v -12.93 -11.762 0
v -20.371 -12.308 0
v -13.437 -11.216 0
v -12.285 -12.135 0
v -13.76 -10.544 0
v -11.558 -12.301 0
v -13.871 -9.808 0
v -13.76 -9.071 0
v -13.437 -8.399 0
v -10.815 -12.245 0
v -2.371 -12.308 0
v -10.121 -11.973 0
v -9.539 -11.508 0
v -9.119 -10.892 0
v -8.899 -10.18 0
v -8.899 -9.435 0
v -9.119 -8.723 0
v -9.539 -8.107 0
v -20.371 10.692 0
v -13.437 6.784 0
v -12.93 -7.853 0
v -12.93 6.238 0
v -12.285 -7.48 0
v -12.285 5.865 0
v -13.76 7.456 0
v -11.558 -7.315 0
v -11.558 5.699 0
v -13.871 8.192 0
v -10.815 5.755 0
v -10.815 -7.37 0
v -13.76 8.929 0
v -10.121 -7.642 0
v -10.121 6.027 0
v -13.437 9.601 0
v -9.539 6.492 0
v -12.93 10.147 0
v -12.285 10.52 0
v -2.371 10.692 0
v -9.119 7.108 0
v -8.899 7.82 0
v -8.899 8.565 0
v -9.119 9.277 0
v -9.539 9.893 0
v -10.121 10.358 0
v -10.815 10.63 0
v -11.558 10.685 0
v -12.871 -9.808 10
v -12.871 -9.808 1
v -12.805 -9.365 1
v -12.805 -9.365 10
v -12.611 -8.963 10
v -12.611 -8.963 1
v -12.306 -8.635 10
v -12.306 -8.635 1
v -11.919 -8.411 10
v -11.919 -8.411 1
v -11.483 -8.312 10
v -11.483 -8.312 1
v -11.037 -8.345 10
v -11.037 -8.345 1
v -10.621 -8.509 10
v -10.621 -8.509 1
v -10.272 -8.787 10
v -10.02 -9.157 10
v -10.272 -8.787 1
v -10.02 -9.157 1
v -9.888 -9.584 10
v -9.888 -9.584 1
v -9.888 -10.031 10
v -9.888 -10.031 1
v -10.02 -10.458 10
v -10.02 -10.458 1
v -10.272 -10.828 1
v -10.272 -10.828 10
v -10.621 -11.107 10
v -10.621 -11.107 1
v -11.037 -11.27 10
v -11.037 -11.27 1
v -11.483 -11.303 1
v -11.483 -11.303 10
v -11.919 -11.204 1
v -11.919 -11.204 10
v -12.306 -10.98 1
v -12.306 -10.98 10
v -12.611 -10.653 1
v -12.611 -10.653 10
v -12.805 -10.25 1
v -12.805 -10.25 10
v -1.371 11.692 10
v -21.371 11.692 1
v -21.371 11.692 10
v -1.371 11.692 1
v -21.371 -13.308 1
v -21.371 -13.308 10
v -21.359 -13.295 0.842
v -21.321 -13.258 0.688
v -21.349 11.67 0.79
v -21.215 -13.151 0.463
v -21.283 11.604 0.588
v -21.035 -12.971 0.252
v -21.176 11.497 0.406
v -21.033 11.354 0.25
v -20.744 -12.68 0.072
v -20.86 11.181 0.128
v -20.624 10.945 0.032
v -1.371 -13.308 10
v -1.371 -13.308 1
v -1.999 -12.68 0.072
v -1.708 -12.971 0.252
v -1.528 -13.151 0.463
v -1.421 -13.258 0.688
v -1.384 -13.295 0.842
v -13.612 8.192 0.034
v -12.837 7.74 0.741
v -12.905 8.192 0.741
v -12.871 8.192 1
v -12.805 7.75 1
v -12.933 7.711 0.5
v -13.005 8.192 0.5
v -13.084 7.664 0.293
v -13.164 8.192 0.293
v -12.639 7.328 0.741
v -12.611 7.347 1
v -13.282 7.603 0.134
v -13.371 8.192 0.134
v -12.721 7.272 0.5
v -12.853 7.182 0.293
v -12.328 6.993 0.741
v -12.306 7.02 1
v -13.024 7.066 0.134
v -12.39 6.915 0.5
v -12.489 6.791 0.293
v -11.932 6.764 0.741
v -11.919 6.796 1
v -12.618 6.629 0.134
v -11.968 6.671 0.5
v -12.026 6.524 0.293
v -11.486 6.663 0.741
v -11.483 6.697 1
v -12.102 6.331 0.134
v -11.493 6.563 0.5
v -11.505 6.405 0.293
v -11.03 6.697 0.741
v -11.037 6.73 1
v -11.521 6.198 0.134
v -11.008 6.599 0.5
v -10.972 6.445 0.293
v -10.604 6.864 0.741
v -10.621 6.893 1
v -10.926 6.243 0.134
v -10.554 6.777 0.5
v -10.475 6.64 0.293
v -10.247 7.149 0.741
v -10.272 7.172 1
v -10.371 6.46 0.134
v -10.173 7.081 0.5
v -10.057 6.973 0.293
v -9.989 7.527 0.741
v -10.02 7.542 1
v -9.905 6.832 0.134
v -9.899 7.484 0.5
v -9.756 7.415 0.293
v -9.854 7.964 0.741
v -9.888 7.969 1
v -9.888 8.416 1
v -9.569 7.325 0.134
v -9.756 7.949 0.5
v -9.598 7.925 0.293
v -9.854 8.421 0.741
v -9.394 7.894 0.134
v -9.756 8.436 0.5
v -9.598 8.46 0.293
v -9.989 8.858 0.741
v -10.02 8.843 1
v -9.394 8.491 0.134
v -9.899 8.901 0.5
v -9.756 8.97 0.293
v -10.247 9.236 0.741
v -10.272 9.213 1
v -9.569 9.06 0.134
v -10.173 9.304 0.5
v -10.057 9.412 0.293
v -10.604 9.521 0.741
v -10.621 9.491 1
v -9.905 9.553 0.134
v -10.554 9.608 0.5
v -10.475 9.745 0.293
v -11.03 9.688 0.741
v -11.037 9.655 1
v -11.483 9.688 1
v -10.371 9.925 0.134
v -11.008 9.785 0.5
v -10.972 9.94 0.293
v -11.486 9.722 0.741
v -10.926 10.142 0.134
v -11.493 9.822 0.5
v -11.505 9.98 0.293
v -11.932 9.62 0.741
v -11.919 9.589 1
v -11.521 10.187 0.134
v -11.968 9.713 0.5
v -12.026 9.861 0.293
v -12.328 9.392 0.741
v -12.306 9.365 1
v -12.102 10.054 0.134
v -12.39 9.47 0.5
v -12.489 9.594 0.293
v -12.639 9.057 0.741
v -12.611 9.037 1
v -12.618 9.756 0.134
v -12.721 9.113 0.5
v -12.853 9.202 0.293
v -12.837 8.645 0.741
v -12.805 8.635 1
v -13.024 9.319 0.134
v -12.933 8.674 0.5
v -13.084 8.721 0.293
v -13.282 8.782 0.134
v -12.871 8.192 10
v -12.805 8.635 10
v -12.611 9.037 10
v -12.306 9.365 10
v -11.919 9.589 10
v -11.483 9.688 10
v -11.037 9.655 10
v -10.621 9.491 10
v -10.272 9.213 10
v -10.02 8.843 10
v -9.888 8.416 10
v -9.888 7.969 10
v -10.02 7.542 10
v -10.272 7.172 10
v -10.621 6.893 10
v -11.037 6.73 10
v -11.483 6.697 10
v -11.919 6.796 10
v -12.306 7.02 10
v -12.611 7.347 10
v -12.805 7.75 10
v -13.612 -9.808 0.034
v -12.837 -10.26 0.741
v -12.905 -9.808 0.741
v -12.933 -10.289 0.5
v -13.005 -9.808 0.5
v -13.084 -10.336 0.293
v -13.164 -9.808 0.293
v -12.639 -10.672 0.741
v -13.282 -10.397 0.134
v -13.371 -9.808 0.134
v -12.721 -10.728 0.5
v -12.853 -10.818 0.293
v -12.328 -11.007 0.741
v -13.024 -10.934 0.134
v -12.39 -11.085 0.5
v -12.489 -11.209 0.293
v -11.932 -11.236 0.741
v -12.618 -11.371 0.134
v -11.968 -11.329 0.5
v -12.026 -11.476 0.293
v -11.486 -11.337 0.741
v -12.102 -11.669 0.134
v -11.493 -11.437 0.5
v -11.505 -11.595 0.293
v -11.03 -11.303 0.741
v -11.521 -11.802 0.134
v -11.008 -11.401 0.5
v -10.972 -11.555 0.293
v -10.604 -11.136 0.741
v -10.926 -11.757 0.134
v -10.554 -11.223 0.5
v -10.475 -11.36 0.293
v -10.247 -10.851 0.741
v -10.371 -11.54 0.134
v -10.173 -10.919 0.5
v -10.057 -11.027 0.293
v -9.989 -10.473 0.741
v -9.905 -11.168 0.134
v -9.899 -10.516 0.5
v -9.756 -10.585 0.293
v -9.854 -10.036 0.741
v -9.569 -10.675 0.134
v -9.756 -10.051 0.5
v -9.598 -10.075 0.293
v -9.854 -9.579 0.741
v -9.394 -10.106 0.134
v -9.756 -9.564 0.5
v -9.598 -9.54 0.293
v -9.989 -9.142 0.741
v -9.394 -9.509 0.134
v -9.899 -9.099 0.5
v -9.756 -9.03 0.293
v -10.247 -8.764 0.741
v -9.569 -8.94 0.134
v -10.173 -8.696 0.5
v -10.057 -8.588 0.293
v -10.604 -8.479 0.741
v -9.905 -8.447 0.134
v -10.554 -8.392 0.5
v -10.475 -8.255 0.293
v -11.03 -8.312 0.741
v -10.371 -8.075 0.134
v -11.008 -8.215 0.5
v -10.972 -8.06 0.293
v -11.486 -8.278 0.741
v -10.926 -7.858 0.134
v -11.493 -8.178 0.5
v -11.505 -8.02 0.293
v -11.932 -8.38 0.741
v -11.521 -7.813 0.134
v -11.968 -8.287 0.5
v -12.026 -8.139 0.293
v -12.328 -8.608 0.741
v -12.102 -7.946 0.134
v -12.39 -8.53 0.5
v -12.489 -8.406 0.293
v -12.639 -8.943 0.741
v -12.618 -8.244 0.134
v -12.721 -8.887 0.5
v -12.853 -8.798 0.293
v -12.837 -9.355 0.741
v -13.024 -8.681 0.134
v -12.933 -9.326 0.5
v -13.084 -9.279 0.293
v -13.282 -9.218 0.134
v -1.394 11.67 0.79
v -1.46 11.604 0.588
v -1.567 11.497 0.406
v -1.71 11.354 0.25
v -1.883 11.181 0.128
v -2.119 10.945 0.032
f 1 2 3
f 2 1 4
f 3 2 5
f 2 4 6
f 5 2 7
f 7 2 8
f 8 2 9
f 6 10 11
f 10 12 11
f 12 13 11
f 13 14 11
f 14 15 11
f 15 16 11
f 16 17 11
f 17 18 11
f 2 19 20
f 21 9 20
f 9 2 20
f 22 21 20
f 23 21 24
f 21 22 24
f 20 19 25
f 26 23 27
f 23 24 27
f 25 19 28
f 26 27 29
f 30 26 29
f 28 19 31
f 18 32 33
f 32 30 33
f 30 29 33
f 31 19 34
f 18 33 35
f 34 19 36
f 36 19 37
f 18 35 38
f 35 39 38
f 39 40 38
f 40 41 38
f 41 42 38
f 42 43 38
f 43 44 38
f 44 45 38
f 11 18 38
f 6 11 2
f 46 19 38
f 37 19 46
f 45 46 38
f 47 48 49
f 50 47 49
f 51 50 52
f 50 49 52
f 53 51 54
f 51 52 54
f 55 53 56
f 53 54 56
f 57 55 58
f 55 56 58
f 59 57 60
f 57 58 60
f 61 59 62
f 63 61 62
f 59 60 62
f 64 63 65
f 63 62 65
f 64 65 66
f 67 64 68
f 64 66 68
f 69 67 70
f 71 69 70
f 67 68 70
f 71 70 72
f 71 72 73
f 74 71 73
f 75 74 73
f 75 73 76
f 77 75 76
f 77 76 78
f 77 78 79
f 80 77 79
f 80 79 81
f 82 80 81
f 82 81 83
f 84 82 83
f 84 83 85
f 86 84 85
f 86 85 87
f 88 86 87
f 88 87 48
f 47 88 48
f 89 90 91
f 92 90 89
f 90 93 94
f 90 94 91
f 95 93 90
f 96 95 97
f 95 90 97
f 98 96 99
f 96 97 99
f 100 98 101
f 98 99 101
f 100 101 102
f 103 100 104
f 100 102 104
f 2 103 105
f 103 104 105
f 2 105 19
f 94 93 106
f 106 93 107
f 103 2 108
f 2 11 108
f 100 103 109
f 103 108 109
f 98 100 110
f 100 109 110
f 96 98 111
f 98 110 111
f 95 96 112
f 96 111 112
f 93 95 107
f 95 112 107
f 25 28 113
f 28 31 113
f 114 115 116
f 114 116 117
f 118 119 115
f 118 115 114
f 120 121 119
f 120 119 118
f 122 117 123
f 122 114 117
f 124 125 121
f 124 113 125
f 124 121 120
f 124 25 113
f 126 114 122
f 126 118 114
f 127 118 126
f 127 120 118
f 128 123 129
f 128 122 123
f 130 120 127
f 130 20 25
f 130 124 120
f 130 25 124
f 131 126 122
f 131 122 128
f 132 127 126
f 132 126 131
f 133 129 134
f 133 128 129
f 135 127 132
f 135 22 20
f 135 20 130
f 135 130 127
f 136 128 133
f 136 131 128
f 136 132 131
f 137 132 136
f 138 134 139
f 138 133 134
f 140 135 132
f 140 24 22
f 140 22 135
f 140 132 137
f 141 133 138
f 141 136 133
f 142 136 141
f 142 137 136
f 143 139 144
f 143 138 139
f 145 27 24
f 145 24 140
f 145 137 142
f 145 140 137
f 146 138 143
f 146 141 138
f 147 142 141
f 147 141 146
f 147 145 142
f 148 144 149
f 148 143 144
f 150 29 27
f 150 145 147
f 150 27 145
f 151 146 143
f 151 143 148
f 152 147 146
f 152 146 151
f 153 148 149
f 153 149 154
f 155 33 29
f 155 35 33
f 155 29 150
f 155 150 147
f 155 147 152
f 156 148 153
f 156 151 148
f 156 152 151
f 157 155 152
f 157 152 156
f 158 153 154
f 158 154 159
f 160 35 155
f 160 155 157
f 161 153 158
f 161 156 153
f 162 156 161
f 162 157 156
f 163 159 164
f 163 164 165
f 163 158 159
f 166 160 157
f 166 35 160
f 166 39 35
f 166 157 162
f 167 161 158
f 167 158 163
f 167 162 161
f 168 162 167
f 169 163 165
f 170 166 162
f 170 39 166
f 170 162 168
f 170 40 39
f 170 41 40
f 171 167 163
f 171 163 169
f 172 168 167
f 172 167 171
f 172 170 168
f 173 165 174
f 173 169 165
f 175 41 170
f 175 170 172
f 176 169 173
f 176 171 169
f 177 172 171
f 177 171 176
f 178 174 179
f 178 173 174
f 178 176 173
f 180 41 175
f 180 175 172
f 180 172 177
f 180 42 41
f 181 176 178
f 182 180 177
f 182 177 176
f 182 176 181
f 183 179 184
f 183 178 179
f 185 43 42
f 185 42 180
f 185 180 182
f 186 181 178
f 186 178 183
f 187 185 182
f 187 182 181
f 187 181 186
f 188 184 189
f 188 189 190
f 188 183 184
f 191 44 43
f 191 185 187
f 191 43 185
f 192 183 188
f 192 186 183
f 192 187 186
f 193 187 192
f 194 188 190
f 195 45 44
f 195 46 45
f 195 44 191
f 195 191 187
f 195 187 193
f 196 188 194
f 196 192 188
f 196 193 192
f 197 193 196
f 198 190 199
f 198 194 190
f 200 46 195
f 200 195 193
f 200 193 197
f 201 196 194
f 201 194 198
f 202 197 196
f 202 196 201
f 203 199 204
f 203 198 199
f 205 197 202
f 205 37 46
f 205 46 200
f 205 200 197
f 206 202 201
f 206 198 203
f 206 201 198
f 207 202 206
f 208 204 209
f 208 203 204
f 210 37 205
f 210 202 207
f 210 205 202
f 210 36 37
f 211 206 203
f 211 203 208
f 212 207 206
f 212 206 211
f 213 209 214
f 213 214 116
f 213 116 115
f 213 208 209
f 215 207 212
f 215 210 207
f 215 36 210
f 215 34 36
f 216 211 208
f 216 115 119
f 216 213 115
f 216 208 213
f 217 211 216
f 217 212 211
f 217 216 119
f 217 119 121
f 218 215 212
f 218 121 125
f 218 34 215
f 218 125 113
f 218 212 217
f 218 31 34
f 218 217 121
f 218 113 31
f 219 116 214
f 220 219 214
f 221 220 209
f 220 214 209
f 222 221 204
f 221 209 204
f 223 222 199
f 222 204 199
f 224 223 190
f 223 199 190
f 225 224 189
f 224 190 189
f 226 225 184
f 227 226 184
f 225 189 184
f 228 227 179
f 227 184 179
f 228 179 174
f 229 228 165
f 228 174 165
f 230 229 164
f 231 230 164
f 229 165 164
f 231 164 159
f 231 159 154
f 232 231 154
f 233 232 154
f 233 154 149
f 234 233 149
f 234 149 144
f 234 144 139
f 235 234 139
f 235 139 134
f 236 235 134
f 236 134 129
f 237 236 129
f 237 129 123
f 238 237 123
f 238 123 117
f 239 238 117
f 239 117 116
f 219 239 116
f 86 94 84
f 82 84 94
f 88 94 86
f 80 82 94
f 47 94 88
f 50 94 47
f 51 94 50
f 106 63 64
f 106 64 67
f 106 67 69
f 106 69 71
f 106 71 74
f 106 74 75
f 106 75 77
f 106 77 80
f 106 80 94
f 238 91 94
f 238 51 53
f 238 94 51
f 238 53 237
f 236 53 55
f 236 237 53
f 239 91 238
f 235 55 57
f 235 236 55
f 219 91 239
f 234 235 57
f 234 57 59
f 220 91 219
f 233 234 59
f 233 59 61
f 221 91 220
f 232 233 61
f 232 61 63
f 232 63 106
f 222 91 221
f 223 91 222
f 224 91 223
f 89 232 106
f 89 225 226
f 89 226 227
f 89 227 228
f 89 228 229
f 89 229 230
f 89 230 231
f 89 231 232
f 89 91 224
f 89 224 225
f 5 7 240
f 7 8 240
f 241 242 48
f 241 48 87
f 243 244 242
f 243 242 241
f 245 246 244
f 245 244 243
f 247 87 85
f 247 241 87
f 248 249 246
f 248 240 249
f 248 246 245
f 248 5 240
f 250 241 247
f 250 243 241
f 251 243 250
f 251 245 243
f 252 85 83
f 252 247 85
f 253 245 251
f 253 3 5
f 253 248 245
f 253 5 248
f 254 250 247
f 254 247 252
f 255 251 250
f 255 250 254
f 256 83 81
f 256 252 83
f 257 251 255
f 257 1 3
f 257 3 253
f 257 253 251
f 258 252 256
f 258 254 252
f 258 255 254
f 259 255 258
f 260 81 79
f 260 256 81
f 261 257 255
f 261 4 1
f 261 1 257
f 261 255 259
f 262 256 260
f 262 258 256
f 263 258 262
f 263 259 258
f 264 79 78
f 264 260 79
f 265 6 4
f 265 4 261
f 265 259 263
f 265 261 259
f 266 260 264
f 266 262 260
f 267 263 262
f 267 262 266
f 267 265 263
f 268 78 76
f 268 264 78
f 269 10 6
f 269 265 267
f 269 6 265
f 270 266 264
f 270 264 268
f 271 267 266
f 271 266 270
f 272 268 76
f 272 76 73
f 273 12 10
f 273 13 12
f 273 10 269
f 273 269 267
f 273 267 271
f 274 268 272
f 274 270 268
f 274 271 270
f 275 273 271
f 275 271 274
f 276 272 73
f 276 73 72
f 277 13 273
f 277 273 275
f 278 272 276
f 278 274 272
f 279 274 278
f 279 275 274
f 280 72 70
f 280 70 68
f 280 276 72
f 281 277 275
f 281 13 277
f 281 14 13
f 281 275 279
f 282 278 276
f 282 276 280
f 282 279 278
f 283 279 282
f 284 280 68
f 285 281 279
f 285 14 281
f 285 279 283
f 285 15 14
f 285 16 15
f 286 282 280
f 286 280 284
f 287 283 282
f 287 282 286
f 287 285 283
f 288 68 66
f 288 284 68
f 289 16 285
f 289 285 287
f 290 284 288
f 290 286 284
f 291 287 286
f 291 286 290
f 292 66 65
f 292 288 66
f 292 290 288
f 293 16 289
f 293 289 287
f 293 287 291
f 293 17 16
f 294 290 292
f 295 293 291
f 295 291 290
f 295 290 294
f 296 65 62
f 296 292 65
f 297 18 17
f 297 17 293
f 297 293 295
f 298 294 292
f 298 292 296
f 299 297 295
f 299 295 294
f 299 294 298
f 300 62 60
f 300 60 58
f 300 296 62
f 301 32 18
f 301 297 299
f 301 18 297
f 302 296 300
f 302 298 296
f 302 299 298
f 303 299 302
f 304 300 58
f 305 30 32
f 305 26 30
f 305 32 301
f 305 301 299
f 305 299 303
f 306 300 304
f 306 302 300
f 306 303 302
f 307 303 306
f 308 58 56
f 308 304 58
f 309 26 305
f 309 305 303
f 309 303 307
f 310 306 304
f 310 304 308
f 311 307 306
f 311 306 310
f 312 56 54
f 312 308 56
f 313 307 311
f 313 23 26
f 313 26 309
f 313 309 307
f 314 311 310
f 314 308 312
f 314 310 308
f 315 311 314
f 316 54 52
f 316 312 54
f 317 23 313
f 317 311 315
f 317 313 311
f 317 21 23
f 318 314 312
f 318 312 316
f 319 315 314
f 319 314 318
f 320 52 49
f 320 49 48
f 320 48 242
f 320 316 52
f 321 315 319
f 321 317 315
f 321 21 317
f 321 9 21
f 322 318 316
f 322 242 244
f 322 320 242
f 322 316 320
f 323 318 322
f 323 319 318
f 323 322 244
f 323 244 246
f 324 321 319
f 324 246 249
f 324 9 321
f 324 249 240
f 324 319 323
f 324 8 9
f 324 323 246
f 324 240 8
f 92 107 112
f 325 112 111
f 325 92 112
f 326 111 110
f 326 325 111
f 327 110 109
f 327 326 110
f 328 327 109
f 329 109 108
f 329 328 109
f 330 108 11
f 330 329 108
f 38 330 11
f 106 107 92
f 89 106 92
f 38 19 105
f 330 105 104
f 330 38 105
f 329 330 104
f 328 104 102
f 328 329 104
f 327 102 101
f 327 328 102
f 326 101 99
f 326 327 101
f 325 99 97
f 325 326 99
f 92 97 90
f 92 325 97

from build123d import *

# Parameters (mm, degrees)
F0_W     = 20
F0_H     = 25
F1_DEPTH = 10
F3_D     = 3
F3_DEPTH = 10
F3_TIP   = 0.9012909285
F4_R     = 0.99999


# Not quite as in the source:
# - a fillet or chamfer is up to 0.001 mm smaller than in the source, because OpenCascade refuses the exact size


with BuildPart() as f1:
    # F0 (on Top) → F1 (new body)
    with BuildSketch(Plane.XY):
        with Locations((-11.3712290768, -0.8075441738)):
            Rectangle(F0_W, F0_H)
    extrude(amount=F1_DEPTH)

    # F3
    with Locations(Plane.XY.offset(10)):
        with Locations((-11.3712290768, 8.1924558262), (-11.3712290768, -9.8075441738)):
            Hole(F3_D / 2, depth=F3_DEPTH)
            with Locations((0, 0, -(F3_DEPTH + F3_TIP / 2))):  # 118° drill point
                Cone(0, F3_D / 2, F3_TIP, mode=Mode.SUBTRACT)

    # F4 (radius 1 in the source; OpenCascade refuses exactly that, so slightly less here)
    f4_edges = [f1.edges().sort_by_distance(p)[0] for p in [
        (-11.371229, -13.307544, 0),
        (-21.371229, -0.807544, 0),
        (-1.371229, -0.807544, 0),
        (-11.371229, 11.692456, 0),
        (-12.871229, -9.807544, 0),
        (-12.871229, 8.192456, 0),
    ]]
    fillet(f4_edges, radius=F4_R)


solid = f1.part
